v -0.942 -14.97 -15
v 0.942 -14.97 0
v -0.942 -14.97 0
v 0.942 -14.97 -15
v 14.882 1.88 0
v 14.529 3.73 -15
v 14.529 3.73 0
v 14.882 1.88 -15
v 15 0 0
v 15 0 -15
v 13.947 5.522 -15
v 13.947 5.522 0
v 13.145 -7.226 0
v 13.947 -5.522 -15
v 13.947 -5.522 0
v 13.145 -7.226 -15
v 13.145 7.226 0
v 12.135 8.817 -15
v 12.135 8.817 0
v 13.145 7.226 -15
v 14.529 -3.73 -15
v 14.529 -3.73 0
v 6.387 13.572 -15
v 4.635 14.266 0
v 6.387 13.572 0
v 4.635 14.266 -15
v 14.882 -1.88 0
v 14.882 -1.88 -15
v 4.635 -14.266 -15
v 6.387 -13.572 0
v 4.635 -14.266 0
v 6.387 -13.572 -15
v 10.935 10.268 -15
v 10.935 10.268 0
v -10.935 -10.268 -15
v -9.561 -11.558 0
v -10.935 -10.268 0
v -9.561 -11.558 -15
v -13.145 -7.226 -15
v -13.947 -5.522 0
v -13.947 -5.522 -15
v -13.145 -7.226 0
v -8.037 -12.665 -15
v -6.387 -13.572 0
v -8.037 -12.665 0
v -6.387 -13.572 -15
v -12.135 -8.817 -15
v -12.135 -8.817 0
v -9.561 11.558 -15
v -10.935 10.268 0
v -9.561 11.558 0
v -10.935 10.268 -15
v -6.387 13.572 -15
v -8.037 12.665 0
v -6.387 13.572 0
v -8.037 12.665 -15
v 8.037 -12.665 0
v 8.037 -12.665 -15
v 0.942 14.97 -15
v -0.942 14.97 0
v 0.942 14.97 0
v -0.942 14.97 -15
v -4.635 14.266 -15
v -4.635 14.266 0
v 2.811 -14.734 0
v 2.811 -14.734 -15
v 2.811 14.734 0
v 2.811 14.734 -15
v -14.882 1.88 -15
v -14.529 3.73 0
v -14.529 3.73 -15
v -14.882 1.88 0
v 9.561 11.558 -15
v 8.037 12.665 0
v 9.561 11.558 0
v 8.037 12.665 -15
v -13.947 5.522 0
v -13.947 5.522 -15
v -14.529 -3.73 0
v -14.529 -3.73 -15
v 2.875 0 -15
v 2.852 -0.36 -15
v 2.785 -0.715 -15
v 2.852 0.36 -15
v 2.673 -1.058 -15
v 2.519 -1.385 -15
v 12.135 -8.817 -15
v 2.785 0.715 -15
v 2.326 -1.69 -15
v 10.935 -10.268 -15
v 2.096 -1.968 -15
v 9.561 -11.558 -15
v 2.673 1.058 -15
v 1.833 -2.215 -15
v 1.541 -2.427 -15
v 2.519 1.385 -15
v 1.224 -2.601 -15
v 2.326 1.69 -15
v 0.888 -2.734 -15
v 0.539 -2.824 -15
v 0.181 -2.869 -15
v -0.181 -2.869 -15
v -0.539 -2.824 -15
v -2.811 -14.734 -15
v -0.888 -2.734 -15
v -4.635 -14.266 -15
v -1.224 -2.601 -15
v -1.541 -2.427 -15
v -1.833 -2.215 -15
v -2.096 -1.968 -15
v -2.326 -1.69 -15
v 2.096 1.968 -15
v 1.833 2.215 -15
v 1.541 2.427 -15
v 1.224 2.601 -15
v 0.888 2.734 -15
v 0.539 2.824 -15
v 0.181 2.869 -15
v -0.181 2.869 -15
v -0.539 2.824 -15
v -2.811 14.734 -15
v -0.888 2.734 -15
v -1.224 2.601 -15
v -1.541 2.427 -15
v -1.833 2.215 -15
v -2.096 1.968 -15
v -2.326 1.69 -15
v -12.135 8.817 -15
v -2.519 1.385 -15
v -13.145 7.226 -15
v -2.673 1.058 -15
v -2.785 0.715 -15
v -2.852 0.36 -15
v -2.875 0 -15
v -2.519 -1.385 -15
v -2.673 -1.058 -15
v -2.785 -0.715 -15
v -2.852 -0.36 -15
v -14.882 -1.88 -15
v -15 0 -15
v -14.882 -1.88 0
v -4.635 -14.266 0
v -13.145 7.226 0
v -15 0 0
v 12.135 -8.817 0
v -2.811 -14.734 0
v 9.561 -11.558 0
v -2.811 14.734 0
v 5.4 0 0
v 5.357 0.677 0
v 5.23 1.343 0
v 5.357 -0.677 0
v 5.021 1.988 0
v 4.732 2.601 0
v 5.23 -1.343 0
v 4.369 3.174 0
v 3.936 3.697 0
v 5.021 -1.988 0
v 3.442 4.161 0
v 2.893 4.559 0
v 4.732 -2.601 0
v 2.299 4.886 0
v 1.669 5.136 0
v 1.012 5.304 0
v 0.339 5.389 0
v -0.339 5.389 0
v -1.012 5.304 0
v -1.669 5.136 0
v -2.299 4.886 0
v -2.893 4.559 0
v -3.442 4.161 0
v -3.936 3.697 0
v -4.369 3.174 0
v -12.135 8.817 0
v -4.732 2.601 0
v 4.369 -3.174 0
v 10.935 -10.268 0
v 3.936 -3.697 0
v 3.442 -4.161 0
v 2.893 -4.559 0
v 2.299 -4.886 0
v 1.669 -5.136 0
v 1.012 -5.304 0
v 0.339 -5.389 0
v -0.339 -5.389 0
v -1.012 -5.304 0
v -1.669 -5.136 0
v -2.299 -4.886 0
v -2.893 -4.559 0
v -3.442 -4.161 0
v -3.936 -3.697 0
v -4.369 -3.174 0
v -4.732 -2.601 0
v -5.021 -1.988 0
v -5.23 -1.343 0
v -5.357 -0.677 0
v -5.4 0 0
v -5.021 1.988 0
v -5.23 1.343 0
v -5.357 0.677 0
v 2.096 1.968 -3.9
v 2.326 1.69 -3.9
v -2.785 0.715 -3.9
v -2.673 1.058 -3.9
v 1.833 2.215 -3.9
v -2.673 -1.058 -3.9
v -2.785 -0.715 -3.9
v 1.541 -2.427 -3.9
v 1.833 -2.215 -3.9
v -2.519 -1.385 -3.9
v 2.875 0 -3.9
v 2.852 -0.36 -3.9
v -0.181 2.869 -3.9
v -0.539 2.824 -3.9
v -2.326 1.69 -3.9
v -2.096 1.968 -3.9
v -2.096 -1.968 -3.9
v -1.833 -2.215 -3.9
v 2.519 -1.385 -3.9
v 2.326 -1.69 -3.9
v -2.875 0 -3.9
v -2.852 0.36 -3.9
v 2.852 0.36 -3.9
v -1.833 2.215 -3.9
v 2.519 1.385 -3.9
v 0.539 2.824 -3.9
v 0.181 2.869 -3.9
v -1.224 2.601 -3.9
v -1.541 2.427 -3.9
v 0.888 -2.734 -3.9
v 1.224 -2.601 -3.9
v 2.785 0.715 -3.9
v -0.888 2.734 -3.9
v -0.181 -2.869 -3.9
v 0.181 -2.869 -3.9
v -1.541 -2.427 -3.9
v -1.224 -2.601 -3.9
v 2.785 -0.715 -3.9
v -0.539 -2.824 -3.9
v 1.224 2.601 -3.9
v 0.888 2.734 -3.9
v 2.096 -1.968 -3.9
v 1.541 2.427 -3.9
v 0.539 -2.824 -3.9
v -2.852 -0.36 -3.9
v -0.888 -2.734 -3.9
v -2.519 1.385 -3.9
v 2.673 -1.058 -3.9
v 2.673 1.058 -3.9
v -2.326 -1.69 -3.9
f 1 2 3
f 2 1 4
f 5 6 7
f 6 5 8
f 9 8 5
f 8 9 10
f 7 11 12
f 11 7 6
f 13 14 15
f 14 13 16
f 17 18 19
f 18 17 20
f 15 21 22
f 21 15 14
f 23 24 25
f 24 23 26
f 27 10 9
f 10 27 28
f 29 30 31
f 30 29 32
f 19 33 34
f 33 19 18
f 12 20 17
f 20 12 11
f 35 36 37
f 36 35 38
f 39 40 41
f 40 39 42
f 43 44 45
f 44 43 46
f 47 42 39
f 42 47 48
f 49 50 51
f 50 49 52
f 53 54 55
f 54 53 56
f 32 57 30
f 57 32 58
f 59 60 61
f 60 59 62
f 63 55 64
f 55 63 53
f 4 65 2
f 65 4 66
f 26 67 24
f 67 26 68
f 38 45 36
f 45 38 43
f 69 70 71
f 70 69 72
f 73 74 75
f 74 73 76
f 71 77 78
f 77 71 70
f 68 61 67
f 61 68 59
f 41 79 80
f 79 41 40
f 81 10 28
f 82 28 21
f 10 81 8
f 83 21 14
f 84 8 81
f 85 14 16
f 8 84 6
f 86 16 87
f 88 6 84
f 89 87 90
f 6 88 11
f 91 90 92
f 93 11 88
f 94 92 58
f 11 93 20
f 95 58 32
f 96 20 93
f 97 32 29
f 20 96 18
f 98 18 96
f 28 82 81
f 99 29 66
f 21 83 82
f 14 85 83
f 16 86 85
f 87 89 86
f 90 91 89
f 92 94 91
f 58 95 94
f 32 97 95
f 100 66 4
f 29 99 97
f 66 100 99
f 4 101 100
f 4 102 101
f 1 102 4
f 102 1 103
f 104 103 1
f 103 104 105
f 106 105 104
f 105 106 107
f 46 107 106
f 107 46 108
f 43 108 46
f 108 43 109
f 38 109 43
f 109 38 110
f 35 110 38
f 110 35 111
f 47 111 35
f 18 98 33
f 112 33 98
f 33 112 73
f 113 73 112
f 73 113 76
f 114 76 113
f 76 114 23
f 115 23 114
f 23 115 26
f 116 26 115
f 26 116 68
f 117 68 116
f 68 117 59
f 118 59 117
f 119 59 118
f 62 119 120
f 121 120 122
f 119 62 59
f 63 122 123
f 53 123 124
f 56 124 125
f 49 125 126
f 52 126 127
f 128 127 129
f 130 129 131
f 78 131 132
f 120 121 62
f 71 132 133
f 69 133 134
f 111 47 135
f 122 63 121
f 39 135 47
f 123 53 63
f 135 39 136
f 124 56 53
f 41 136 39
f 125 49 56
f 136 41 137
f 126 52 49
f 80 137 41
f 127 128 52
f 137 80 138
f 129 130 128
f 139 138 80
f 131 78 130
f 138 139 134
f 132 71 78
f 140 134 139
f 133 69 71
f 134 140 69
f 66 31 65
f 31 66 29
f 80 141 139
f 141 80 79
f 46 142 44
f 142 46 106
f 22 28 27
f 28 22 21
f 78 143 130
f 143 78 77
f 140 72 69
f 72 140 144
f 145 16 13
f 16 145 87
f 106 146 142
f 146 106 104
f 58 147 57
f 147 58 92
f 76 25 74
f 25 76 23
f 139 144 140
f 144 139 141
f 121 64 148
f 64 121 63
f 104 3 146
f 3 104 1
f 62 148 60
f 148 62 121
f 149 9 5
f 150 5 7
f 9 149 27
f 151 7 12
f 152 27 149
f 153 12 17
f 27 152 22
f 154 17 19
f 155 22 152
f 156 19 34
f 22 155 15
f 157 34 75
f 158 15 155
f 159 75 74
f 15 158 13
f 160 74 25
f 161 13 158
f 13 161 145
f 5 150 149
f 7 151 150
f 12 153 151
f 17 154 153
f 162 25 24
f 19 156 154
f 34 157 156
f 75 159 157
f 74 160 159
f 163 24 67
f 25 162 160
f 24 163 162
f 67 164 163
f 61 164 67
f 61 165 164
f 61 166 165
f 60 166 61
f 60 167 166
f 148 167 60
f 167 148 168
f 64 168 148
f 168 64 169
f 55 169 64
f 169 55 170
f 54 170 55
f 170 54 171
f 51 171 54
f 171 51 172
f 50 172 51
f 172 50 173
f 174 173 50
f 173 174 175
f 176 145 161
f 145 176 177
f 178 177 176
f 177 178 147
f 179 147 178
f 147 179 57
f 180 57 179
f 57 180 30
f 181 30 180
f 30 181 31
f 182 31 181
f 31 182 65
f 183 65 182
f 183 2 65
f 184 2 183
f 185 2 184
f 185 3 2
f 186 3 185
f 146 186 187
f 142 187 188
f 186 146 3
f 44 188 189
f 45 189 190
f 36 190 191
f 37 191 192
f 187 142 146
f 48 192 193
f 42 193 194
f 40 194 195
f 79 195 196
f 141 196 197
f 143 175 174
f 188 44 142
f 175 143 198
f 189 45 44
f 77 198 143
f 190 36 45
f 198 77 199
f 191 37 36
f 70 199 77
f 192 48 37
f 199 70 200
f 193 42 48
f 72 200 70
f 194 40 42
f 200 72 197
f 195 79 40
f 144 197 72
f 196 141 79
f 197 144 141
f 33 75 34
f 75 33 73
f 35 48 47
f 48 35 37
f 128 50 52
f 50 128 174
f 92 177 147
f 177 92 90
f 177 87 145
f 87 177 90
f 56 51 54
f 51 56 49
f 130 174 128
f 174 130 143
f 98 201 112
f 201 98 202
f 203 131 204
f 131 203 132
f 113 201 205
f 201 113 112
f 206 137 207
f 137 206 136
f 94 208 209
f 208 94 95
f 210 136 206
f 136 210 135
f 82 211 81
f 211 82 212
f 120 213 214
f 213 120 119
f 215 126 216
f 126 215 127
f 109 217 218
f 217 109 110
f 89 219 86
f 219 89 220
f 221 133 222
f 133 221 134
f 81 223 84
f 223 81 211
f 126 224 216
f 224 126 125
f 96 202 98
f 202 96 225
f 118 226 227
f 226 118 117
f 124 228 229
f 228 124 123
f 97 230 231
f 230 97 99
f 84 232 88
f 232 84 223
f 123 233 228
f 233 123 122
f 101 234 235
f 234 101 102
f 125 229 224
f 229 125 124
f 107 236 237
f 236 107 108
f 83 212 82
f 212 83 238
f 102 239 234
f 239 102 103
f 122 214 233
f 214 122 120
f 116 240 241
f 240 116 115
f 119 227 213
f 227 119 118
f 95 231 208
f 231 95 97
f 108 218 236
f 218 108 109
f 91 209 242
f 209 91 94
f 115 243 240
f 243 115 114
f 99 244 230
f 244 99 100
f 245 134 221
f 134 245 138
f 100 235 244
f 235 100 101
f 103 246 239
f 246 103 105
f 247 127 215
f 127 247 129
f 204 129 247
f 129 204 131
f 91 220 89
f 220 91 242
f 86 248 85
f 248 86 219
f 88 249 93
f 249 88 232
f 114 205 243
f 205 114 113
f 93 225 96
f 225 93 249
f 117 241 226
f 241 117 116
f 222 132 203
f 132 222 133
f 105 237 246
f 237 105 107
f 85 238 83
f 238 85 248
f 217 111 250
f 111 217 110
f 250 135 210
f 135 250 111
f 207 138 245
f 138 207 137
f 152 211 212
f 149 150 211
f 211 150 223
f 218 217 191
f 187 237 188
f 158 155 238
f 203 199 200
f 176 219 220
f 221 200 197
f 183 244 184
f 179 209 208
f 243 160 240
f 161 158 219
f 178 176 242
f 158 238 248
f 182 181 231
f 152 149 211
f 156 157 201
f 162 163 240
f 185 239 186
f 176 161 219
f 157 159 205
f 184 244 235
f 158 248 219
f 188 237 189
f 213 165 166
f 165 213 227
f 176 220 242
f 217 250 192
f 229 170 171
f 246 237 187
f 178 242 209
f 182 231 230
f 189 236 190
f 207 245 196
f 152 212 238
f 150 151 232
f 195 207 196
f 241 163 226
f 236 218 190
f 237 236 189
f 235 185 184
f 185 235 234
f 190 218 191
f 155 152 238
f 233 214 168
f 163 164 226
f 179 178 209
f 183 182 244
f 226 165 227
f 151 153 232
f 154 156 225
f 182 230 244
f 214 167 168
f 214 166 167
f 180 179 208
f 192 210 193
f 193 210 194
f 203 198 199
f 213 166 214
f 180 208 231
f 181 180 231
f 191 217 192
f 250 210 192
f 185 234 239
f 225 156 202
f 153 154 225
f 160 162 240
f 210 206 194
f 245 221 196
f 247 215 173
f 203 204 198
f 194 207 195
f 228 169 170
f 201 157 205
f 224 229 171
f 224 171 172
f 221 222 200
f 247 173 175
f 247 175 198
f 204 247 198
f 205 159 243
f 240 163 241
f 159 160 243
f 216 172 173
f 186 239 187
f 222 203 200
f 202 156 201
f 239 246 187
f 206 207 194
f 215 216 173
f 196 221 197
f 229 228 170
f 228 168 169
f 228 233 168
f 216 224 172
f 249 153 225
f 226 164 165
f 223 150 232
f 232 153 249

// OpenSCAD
$fn = 50;

difference() {
	union() {
		translate(v = [0, 0, -15.0]) {
			cylinder(h = 15, r = 15.0);
		}
		#translate(v = [0, 0, -18.0]) {
			cylinder(h = 18, r = 2.875);
		}
	}
	union() {
		translate(v = [0, 0, 0]) {
			rotate(a = [0, 0, 0]) {
				difference() {
					union() {
						translate(v = [0, 0, -18.0]) {
							cylinder(h = 18, r = 2.6);
						}
						translate(v = [0, 0, -3.9]) {
							cylinder(h = 3.9, r1 = 2.875, r2 = 5.4);
						}
						translate(v = [0, 0, -18.0]) {
							cylinder(h = 18, r = 2.875);
						}
						translate(v = [0, 0, -18.0]) {
							cylinder(h = 18, r = 2.6);
						}
					}
					union();
				}
			}
		}
	}
}
